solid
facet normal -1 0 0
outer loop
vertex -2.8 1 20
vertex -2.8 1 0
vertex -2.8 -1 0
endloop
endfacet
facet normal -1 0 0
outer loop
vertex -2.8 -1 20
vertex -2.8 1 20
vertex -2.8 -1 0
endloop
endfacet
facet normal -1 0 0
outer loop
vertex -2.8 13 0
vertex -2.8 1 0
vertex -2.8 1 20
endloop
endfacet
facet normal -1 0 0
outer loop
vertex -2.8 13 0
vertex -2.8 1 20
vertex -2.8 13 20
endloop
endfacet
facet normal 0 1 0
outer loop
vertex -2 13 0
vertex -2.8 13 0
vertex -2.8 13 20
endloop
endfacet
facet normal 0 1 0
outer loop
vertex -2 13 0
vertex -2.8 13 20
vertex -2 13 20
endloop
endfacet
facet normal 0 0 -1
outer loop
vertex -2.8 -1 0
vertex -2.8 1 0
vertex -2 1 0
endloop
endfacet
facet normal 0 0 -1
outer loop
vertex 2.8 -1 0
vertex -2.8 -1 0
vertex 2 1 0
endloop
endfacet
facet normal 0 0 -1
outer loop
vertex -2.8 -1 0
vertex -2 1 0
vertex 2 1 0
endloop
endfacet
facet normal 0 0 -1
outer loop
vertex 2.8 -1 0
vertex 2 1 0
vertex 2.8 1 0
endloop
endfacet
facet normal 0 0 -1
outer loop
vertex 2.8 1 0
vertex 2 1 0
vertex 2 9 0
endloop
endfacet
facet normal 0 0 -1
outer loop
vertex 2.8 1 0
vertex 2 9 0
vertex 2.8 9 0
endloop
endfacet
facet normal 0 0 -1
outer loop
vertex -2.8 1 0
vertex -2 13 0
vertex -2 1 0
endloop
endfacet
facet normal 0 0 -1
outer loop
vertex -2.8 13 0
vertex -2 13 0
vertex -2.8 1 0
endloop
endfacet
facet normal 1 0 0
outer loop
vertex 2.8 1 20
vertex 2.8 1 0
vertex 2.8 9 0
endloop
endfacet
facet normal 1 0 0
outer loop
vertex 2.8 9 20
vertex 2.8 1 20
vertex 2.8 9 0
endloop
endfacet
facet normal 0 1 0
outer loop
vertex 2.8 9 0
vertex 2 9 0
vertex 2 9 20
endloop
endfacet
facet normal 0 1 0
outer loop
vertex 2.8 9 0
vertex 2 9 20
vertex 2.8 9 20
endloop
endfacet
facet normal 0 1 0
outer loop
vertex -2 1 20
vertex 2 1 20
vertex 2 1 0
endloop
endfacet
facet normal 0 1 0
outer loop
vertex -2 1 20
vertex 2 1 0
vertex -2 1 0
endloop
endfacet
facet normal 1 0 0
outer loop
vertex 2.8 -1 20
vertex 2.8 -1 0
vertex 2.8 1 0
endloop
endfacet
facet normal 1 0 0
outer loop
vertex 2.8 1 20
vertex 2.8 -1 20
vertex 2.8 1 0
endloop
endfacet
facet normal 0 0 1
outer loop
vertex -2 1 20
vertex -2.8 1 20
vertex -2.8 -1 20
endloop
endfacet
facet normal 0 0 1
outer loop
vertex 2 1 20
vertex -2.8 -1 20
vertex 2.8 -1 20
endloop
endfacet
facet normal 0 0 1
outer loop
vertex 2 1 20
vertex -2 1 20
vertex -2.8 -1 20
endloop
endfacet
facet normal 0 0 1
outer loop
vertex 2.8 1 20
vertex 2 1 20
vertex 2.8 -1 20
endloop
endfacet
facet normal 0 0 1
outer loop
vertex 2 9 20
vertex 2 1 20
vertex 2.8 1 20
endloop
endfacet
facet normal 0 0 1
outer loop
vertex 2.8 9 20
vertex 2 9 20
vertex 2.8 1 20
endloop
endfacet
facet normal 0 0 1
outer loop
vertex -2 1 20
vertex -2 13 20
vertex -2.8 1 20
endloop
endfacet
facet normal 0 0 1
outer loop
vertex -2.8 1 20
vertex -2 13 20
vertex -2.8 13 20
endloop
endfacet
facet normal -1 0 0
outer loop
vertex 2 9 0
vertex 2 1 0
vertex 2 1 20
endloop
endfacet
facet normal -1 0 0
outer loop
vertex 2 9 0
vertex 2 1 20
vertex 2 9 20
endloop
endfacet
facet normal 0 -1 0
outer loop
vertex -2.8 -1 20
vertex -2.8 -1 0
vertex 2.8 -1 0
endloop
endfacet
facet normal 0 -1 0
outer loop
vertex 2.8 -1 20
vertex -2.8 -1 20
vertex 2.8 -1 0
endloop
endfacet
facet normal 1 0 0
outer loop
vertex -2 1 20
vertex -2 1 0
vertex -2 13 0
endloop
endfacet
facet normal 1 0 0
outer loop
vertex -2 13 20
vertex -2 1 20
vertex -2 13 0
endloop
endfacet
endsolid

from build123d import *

# Parameters (mm, degrees)
F0_W     = 0.8
F0_H     = 12
F0_H_2   = 8
F1_DEPTH = 20


with BuildPart() as f1:
    # F0 (on Top) → F1 (new body)
    with BuildSketch(Plane.XY):
        with Locations((-2.40001, 7)):
            Rectangle(F0_W, F0_H)
        Polygon((-2.79999, -1), (2.80001, -1), (2.79999, 1), (1.99999, 1), (-2.00001, 1), (-2.80001, 1), align=None)
        with Locations((2.39999, 5)):
            Rectangle(F0_W, F0_H_2)
    extrude(amount=F1_DEPTH)


solid = f1.part
